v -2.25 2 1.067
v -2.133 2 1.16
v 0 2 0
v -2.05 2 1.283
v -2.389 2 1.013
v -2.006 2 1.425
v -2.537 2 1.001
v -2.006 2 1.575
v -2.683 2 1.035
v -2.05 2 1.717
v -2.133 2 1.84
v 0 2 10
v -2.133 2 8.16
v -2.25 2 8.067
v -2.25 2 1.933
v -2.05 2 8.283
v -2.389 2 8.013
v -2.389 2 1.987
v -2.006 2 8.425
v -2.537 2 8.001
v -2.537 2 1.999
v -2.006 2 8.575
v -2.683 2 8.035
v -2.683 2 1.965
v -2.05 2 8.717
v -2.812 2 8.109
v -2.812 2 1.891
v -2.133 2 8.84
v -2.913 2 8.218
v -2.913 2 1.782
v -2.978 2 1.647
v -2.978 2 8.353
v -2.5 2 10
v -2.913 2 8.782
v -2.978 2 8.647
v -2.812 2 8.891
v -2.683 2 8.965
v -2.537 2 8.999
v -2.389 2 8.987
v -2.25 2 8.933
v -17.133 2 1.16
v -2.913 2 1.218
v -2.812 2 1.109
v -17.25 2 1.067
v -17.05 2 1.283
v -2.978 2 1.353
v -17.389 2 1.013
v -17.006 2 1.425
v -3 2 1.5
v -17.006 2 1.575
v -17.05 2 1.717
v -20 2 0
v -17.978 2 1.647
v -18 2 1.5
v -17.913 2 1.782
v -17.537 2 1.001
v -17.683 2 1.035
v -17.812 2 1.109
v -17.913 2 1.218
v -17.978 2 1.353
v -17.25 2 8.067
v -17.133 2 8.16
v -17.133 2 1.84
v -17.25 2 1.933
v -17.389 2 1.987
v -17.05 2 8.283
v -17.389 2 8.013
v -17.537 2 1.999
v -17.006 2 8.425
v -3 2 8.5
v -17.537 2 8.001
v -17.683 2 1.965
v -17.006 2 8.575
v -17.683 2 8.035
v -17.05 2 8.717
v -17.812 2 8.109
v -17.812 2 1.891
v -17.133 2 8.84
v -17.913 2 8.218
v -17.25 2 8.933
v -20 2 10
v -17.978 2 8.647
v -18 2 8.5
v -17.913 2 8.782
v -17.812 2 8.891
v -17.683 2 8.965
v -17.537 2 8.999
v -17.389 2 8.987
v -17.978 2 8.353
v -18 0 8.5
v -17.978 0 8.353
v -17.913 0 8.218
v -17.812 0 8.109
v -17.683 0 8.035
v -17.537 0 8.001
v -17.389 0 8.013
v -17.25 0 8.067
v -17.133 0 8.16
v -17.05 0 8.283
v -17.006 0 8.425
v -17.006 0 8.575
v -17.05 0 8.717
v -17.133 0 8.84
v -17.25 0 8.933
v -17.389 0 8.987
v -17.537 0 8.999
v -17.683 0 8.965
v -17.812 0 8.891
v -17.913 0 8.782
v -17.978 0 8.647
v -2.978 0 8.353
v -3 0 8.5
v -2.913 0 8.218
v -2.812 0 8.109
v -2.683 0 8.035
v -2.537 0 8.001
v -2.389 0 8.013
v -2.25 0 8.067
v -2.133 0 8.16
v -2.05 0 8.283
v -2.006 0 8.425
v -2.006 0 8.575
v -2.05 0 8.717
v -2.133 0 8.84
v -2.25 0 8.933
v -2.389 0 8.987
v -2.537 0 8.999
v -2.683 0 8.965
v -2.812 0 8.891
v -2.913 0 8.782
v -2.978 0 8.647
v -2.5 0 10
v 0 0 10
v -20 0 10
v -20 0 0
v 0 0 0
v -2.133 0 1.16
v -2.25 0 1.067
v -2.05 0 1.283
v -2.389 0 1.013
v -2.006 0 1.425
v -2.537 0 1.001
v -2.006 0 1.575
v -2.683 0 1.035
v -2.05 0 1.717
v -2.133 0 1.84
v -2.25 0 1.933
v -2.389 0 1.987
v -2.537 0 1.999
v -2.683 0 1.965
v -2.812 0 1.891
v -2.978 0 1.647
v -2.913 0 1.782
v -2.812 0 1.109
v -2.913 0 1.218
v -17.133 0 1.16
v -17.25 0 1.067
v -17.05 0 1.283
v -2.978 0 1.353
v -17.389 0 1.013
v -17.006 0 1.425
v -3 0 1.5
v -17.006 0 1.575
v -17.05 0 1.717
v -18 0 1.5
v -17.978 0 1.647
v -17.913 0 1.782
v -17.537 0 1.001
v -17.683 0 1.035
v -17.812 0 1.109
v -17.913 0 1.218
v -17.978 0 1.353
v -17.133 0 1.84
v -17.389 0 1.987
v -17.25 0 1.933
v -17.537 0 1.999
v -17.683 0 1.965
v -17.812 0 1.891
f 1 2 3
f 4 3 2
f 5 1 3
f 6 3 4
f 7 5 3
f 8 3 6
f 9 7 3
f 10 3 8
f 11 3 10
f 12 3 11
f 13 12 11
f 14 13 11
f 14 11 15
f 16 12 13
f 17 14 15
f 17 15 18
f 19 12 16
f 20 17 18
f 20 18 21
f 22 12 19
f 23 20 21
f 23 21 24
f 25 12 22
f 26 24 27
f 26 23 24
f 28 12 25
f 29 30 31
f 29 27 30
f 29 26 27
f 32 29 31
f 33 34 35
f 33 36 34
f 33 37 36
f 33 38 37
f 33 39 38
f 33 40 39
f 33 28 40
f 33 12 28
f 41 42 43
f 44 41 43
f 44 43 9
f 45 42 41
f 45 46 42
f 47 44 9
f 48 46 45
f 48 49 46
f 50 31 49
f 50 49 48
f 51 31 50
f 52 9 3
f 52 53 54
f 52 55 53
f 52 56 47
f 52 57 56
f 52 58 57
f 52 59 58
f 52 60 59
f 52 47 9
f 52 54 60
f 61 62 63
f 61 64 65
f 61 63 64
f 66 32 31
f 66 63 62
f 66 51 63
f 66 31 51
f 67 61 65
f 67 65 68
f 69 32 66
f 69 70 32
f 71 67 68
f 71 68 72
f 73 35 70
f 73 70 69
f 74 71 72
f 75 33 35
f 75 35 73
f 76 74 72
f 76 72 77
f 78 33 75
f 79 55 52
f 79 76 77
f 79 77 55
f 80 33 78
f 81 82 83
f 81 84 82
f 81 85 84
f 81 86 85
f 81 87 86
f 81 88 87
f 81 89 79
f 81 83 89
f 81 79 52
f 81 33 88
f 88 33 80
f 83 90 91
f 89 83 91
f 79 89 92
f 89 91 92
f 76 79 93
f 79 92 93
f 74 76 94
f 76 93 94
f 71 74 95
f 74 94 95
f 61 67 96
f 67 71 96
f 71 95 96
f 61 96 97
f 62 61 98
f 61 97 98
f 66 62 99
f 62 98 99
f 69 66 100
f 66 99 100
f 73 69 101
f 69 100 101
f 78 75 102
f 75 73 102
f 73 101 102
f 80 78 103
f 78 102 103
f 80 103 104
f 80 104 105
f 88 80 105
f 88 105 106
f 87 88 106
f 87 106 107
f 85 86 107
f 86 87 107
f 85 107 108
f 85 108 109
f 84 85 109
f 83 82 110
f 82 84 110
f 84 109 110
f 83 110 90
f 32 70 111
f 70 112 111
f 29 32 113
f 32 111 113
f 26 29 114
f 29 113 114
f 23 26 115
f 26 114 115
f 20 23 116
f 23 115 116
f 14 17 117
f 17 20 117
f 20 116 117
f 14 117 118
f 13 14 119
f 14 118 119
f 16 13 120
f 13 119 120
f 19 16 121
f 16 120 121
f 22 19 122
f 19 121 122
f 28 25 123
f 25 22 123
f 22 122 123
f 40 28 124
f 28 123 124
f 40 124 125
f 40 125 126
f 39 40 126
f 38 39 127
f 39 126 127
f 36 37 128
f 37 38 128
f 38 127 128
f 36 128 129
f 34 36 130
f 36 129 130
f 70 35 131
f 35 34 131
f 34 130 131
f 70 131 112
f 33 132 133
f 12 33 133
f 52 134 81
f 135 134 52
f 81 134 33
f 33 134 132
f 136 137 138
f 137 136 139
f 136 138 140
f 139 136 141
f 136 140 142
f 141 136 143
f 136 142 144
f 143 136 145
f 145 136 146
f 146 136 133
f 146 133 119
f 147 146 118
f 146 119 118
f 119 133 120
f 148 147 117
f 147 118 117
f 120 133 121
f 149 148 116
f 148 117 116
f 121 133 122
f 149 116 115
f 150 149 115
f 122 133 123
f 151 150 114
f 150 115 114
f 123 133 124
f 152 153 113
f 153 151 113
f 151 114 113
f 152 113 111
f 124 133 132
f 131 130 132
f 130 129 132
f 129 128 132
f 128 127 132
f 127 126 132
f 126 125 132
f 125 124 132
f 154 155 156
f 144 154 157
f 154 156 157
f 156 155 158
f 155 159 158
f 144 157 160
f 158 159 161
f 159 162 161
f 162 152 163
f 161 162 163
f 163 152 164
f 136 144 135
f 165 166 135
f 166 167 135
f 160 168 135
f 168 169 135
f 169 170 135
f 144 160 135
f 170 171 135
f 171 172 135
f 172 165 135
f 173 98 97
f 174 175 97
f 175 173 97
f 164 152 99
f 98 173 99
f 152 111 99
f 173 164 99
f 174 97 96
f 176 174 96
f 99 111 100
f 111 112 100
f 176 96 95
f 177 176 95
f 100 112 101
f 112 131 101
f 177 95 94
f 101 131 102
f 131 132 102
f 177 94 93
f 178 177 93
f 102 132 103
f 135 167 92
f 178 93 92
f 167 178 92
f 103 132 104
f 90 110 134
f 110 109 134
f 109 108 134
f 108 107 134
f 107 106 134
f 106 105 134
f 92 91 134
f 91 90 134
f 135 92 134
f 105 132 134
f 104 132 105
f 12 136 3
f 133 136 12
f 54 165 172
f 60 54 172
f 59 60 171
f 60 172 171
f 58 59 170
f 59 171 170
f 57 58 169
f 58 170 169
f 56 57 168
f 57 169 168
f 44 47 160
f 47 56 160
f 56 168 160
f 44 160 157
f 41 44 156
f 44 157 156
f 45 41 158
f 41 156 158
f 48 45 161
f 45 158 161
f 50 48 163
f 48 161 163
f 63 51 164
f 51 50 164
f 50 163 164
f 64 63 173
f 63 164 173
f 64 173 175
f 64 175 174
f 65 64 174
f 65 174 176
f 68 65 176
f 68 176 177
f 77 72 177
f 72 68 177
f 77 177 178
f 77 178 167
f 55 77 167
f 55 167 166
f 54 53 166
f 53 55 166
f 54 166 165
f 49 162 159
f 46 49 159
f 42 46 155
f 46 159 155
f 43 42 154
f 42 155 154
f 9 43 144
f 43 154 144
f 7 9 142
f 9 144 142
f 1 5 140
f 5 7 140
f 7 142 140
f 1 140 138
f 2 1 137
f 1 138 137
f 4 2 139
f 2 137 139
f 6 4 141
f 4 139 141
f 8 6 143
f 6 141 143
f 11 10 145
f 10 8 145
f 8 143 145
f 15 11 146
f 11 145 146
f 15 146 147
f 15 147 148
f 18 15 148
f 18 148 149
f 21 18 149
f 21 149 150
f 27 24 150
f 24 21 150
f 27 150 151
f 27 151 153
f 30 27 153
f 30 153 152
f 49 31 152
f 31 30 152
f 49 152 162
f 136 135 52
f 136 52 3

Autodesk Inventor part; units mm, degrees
ref_plane "YZ Plane" through (0, 0, 0) normal (1, 0, 0) x (0, 1, 0)
ref_plane "XZ Plane" through (0, 0, 0) normal (0, 1, 0) x (-1, 0, 0)
ref_plane "XY Plane" through (0, 0, 0) normal (0, 0, 1) x (1, 0, 0)
sketch "Sketch1" plane through (0, 0, 0) normal (0, 1, 0) x (-1, 0, 0)
  line L0 (20, 10) -> (0, 10)
  line L1 (0, 10) -> (20, 10)
  line L2 (20, 10) -> (20, 0)
  line L3 (20, 0) -> (0, 0)
  line L4 (0, 0) -> (0, 10)
  line L5 (0, 10) -> (2.5, 10)
  circle A0 centre (2.5, 8.5) radius 0.5
  circle A1 centre (2.5, 1.5) radius 0.5
  circle A2 centre (17.5, 1.5) radius 0.5
  circle A3 centre (17.5, 8.5) radius 0.5
  point P0 (0, 0)
  point P1 (10, 0)
  point P2 (10, 0)
  point P3 (16.8377, 0)
  point P4 (20, 10)
  dimension "d0" = 20
  dimension "d1" = 2.5
  dimension "d2" = 1
  dimension "d3" = 1
  dimension "d4" = 1
  dimension "d5" = 1
extrude "Extrusion1" add sketch "Sketch1" along normal blind 2
properties part number "bracket"
